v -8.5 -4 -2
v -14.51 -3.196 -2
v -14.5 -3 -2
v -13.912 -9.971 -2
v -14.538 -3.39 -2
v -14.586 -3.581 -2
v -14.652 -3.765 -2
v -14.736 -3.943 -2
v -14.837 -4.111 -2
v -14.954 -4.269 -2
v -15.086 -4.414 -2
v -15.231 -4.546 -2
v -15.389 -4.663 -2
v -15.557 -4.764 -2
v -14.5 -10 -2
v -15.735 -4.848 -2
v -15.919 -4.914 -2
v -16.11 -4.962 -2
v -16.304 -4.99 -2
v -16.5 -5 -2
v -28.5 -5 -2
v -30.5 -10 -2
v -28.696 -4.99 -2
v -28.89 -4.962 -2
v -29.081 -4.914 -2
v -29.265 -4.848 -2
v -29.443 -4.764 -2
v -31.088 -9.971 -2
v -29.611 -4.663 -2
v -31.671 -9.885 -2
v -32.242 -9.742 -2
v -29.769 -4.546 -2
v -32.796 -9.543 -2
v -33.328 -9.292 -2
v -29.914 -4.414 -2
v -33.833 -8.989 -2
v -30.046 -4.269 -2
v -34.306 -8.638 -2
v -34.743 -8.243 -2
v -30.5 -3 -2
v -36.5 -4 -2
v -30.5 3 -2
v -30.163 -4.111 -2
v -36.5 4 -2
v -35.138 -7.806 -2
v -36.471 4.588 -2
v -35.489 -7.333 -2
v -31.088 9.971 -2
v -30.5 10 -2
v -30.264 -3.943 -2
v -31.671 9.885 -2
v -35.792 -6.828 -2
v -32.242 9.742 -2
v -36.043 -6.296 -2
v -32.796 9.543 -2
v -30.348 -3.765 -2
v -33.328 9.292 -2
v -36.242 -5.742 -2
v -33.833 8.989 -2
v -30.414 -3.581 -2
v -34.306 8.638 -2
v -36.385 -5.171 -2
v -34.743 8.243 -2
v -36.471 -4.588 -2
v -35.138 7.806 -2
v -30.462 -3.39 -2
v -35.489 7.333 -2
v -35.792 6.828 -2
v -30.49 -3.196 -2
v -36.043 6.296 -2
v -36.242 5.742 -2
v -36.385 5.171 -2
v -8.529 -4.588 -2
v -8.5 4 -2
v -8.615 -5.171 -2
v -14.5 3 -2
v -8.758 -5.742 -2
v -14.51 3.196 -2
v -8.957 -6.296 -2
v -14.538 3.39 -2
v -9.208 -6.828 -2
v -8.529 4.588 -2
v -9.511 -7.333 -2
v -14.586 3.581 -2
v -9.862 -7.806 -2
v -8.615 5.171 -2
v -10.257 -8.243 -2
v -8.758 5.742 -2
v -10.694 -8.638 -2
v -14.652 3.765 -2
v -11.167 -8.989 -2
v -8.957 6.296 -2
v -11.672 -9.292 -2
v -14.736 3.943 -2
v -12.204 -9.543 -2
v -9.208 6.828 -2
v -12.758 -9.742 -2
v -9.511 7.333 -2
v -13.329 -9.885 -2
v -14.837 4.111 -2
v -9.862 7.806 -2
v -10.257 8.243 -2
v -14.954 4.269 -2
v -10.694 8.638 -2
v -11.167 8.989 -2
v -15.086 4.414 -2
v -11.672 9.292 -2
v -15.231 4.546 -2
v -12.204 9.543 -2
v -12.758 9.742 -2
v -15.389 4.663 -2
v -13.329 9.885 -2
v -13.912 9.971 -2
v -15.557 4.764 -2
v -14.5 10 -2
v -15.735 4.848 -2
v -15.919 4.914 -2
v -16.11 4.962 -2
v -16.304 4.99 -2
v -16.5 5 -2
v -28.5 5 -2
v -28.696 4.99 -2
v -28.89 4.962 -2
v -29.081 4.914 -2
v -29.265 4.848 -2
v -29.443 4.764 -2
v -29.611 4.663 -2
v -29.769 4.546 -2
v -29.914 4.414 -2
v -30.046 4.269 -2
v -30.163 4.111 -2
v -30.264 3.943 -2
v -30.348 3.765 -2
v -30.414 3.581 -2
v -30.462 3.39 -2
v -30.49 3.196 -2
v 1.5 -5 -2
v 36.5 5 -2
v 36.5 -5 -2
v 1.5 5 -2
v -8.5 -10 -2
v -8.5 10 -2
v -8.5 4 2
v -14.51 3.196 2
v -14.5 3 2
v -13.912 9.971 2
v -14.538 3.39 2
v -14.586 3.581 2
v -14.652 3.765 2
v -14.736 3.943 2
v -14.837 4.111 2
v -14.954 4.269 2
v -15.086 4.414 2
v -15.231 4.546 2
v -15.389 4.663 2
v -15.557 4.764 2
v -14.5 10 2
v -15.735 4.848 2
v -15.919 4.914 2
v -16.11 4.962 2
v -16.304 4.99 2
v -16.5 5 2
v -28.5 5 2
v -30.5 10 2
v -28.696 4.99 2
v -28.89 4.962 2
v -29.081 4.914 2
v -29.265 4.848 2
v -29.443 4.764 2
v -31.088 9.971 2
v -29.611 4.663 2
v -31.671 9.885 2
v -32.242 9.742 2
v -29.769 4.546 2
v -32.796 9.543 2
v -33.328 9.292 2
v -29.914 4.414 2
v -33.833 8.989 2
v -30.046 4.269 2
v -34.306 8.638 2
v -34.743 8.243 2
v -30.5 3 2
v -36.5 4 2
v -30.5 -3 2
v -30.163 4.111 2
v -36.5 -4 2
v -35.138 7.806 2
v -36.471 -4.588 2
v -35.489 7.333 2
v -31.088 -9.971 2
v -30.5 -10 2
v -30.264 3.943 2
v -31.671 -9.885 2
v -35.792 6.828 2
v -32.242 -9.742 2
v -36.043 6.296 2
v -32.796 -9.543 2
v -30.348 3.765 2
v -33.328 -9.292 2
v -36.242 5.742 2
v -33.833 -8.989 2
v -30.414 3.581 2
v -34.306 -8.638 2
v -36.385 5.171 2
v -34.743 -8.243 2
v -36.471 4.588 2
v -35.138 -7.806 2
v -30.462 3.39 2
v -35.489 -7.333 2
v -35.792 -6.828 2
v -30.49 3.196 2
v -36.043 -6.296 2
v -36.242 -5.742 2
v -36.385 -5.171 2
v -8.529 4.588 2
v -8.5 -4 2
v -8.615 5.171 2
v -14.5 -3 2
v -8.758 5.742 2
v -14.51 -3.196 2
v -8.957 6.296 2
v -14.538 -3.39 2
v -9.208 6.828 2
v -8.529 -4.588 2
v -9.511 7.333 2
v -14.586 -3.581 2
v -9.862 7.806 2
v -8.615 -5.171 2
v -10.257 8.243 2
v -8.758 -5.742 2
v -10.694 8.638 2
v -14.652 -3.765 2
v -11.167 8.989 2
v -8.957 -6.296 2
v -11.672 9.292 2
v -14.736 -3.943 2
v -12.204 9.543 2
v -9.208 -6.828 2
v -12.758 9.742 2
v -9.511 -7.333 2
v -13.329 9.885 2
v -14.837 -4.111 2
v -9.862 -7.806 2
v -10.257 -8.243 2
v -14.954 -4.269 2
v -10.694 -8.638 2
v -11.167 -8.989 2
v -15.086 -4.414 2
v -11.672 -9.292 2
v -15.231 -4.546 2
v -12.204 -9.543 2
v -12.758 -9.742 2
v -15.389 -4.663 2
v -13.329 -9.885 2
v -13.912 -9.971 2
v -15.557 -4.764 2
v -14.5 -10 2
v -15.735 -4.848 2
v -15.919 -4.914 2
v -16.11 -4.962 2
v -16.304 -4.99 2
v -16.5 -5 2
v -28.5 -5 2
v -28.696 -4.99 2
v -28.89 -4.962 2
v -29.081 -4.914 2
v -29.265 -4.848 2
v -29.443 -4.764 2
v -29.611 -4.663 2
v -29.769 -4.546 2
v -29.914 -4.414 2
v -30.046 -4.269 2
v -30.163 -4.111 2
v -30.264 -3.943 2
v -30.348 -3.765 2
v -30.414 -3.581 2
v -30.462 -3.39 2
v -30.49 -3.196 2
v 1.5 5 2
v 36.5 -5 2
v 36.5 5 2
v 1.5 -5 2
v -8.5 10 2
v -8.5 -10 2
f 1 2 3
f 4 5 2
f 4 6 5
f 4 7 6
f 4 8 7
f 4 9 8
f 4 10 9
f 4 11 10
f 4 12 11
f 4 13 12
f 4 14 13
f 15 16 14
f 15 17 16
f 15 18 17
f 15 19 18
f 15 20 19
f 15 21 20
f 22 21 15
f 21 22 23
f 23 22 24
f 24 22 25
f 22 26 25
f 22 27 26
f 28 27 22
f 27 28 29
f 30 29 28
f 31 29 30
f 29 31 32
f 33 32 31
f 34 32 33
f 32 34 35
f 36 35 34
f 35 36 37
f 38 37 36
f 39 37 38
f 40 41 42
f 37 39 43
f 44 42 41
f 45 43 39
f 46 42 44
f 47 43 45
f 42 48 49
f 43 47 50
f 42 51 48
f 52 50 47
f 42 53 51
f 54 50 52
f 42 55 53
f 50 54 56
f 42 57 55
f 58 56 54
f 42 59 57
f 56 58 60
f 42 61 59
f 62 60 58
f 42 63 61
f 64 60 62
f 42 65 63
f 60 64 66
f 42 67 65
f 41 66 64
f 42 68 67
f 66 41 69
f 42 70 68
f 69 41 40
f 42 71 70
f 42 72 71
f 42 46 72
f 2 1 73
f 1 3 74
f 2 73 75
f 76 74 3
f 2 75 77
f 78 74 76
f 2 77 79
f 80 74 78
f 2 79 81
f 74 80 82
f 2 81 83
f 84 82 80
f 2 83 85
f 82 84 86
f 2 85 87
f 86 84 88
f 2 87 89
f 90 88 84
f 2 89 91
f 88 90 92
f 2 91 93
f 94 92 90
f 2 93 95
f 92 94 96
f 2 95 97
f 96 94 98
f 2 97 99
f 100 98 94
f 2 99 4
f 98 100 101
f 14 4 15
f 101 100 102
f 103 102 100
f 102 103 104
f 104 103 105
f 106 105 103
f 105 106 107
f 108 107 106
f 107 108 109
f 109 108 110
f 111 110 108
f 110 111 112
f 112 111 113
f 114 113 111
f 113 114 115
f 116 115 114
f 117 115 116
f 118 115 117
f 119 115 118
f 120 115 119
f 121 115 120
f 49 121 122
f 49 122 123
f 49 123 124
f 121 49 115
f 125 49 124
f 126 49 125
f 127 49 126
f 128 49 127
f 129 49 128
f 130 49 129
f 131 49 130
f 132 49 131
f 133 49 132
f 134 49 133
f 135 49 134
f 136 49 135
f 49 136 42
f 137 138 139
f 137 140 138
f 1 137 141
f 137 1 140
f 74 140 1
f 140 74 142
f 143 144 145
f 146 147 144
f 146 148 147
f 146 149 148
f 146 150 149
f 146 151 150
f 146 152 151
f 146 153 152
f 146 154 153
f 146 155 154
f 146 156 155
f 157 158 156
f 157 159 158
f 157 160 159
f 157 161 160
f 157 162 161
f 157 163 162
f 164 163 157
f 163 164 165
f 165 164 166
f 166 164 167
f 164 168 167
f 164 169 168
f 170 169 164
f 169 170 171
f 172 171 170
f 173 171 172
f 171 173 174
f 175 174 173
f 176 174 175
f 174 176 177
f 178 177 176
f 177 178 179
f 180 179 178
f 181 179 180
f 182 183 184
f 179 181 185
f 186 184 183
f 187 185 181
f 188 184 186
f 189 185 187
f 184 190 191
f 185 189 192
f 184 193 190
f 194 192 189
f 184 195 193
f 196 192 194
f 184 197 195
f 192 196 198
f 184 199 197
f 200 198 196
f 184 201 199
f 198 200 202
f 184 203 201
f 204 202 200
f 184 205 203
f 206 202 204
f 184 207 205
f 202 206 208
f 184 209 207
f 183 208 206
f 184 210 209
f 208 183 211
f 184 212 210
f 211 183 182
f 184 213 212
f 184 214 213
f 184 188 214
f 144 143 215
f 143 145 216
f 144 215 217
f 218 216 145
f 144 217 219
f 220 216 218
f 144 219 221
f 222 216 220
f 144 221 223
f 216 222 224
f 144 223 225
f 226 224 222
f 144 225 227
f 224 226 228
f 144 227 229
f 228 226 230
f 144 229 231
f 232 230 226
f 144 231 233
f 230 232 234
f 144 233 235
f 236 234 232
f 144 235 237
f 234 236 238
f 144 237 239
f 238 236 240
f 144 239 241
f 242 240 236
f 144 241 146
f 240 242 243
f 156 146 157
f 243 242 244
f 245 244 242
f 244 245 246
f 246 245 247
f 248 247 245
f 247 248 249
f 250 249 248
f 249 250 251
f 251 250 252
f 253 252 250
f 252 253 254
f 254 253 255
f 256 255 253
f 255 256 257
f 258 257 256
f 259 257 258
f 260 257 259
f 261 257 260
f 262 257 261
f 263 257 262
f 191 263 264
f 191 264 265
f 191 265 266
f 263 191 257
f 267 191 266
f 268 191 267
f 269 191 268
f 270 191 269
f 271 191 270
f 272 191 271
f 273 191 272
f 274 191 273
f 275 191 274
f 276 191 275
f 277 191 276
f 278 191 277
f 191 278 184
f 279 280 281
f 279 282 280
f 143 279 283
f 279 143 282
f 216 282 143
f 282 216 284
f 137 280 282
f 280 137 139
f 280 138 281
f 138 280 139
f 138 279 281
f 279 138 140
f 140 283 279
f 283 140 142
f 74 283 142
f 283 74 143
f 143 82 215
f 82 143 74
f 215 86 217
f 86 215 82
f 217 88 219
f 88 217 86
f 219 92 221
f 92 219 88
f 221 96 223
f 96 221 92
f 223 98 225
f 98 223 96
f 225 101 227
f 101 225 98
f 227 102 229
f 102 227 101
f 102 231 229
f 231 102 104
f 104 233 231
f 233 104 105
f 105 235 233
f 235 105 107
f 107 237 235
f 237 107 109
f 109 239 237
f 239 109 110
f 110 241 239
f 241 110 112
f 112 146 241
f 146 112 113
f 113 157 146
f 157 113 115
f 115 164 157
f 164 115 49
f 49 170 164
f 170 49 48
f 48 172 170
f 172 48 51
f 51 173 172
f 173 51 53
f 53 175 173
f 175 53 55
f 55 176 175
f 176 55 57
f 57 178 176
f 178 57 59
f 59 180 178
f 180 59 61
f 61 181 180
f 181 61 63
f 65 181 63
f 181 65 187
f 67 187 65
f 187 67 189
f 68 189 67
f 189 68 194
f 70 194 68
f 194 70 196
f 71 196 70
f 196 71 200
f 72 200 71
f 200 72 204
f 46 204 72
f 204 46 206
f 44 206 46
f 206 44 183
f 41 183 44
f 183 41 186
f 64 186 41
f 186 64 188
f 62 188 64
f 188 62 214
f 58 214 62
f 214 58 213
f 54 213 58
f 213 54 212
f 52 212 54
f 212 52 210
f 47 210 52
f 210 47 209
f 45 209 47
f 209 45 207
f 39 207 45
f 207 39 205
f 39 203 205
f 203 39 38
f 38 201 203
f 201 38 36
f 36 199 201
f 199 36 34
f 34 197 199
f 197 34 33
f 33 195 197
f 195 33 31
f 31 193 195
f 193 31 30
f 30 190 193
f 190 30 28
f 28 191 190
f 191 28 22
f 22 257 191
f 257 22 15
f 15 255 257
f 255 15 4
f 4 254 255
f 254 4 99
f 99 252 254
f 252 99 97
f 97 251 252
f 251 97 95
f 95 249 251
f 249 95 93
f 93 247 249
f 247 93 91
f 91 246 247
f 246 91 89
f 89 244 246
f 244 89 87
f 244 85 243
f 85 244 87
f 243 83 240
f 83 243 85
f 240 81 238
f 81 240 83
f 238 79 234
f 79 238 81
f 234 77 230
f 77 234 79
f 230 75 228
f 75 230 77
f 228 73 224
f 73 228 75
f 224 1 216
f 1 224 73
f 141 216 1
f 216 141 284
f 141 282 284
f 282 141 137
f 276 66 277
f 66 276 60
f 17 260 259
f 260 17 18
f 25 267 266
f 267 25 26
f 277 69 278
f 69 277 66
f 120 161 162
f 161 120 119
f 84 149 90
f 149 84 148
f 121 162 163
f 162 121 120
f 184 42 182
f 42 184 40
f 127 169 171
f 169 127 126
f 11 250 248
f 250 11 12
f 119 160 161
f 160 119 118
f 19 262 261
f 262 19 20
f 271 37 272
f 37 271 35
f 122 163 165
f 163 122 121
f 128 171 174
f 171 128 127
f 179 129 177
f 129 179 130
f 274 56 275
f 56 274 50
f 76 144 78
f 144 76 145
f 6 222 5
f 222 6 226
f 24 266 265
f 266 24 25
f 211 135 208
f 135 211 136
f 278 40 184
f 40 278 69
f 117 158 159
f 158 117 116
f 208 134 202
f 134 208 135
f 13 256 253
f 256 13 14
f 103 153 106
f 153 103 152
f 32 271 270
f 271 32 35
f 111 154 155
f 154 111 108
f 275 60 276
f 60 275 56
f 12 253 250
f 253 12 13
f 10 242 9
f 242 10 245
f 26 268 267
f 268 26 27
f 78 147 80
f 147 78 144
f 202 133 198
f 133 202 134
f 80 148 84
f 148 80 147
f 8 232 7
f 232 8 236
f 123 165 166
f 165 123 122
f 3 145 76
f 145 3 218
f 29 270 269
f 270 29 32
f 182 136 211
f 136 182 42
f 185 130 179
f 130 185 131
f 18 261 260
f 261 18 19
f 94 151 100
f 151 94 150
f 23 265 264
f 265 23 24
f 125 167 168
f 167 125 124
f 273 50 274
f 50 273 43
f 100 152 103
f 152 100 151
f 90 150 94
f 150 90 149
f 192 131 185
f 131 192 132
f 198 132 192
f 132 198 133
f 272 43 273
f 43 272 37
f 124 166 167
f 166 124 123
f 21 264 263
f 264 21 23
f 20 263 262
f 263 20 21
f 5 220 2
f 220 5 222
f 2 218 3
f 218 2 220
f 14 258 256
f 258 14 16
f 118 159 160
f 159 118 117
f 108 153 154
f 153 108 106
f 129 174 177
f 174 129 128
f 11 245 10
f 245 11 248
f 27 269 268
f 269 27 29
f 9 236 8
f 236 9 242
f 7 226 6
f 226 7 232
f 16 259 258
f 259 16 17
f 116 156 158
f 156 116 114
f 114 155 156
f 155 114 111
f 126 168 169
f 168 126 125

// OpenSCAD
$fn=64;

th = 4.0;

L = 73.0;
W = 20.0;

head_len = 28.0;
head_w = 20.0;
head_r = 6.0;

neck_len = 10.0;
handle_len = L - head_len - neck_len;

handle_w = 10.0;

window_len = 16.0;
window_w = 10.0;
window_r = 2.0;

hole_d = 3.0;
hole_offset_x = 6.0;
hole_y = 0.0;

module rounded_rect_2d(len, wid, r){
    r2 = min(r, min(len, wid)/2);
    hull(){
        translate([ len/2 - r2,  wid/2 - r2]) circle(r=r2);
        translate([-len/2 + r2,  wid/2 - r2]) circle(r=r2);
        translate([ len/2 - r2, -wid/2 + r2]) circle(r=r2);
        translate([-len/2 + r2, -wid/2 + r2]) circle(r=r2);
    }
}

module plate_outline_2d(){
    union(){
        translate([-(L/2) + head_len/2, 0])
            rounded_rect_2d(head_len, head_w, head_r);

        translate([ (L/2) - handle_len/2, 0])
            square([handle_len, handle_w], center=true);

        x0 = -(L/2) + head_len;
        x1 = x0 + neck_len;
        polygon(points=[
            [x0,  head_w/2],
            [x0, -head_w/2],
            [x1, -handle_w/2],
            [x1,  handle_w/2]
        ]);
    }
}

module window_cut_2d(){
    translate([-(L/2) + head_len/2, 0])
        rounded_rect_2d(window_len, window_w, window_r);
}

module holes_cut_2d(){
    cx = -(L/2) + head_len/2;
    translate([cx - hole_offset_x, hole_y]) circle(d=hole_d);
    translate([cx + hole_offset_x, hole_y]) circle(d=hole_d);
}

difference(){
    linear_extrude(height=th, center=true)
        plate_outline_2d();

    linear_extrude(height=th+0.4, center=true)
        window_cut_2d();

    linear_extrude(height=th+0.4, center=true)
        holes_cut_2d();
}
